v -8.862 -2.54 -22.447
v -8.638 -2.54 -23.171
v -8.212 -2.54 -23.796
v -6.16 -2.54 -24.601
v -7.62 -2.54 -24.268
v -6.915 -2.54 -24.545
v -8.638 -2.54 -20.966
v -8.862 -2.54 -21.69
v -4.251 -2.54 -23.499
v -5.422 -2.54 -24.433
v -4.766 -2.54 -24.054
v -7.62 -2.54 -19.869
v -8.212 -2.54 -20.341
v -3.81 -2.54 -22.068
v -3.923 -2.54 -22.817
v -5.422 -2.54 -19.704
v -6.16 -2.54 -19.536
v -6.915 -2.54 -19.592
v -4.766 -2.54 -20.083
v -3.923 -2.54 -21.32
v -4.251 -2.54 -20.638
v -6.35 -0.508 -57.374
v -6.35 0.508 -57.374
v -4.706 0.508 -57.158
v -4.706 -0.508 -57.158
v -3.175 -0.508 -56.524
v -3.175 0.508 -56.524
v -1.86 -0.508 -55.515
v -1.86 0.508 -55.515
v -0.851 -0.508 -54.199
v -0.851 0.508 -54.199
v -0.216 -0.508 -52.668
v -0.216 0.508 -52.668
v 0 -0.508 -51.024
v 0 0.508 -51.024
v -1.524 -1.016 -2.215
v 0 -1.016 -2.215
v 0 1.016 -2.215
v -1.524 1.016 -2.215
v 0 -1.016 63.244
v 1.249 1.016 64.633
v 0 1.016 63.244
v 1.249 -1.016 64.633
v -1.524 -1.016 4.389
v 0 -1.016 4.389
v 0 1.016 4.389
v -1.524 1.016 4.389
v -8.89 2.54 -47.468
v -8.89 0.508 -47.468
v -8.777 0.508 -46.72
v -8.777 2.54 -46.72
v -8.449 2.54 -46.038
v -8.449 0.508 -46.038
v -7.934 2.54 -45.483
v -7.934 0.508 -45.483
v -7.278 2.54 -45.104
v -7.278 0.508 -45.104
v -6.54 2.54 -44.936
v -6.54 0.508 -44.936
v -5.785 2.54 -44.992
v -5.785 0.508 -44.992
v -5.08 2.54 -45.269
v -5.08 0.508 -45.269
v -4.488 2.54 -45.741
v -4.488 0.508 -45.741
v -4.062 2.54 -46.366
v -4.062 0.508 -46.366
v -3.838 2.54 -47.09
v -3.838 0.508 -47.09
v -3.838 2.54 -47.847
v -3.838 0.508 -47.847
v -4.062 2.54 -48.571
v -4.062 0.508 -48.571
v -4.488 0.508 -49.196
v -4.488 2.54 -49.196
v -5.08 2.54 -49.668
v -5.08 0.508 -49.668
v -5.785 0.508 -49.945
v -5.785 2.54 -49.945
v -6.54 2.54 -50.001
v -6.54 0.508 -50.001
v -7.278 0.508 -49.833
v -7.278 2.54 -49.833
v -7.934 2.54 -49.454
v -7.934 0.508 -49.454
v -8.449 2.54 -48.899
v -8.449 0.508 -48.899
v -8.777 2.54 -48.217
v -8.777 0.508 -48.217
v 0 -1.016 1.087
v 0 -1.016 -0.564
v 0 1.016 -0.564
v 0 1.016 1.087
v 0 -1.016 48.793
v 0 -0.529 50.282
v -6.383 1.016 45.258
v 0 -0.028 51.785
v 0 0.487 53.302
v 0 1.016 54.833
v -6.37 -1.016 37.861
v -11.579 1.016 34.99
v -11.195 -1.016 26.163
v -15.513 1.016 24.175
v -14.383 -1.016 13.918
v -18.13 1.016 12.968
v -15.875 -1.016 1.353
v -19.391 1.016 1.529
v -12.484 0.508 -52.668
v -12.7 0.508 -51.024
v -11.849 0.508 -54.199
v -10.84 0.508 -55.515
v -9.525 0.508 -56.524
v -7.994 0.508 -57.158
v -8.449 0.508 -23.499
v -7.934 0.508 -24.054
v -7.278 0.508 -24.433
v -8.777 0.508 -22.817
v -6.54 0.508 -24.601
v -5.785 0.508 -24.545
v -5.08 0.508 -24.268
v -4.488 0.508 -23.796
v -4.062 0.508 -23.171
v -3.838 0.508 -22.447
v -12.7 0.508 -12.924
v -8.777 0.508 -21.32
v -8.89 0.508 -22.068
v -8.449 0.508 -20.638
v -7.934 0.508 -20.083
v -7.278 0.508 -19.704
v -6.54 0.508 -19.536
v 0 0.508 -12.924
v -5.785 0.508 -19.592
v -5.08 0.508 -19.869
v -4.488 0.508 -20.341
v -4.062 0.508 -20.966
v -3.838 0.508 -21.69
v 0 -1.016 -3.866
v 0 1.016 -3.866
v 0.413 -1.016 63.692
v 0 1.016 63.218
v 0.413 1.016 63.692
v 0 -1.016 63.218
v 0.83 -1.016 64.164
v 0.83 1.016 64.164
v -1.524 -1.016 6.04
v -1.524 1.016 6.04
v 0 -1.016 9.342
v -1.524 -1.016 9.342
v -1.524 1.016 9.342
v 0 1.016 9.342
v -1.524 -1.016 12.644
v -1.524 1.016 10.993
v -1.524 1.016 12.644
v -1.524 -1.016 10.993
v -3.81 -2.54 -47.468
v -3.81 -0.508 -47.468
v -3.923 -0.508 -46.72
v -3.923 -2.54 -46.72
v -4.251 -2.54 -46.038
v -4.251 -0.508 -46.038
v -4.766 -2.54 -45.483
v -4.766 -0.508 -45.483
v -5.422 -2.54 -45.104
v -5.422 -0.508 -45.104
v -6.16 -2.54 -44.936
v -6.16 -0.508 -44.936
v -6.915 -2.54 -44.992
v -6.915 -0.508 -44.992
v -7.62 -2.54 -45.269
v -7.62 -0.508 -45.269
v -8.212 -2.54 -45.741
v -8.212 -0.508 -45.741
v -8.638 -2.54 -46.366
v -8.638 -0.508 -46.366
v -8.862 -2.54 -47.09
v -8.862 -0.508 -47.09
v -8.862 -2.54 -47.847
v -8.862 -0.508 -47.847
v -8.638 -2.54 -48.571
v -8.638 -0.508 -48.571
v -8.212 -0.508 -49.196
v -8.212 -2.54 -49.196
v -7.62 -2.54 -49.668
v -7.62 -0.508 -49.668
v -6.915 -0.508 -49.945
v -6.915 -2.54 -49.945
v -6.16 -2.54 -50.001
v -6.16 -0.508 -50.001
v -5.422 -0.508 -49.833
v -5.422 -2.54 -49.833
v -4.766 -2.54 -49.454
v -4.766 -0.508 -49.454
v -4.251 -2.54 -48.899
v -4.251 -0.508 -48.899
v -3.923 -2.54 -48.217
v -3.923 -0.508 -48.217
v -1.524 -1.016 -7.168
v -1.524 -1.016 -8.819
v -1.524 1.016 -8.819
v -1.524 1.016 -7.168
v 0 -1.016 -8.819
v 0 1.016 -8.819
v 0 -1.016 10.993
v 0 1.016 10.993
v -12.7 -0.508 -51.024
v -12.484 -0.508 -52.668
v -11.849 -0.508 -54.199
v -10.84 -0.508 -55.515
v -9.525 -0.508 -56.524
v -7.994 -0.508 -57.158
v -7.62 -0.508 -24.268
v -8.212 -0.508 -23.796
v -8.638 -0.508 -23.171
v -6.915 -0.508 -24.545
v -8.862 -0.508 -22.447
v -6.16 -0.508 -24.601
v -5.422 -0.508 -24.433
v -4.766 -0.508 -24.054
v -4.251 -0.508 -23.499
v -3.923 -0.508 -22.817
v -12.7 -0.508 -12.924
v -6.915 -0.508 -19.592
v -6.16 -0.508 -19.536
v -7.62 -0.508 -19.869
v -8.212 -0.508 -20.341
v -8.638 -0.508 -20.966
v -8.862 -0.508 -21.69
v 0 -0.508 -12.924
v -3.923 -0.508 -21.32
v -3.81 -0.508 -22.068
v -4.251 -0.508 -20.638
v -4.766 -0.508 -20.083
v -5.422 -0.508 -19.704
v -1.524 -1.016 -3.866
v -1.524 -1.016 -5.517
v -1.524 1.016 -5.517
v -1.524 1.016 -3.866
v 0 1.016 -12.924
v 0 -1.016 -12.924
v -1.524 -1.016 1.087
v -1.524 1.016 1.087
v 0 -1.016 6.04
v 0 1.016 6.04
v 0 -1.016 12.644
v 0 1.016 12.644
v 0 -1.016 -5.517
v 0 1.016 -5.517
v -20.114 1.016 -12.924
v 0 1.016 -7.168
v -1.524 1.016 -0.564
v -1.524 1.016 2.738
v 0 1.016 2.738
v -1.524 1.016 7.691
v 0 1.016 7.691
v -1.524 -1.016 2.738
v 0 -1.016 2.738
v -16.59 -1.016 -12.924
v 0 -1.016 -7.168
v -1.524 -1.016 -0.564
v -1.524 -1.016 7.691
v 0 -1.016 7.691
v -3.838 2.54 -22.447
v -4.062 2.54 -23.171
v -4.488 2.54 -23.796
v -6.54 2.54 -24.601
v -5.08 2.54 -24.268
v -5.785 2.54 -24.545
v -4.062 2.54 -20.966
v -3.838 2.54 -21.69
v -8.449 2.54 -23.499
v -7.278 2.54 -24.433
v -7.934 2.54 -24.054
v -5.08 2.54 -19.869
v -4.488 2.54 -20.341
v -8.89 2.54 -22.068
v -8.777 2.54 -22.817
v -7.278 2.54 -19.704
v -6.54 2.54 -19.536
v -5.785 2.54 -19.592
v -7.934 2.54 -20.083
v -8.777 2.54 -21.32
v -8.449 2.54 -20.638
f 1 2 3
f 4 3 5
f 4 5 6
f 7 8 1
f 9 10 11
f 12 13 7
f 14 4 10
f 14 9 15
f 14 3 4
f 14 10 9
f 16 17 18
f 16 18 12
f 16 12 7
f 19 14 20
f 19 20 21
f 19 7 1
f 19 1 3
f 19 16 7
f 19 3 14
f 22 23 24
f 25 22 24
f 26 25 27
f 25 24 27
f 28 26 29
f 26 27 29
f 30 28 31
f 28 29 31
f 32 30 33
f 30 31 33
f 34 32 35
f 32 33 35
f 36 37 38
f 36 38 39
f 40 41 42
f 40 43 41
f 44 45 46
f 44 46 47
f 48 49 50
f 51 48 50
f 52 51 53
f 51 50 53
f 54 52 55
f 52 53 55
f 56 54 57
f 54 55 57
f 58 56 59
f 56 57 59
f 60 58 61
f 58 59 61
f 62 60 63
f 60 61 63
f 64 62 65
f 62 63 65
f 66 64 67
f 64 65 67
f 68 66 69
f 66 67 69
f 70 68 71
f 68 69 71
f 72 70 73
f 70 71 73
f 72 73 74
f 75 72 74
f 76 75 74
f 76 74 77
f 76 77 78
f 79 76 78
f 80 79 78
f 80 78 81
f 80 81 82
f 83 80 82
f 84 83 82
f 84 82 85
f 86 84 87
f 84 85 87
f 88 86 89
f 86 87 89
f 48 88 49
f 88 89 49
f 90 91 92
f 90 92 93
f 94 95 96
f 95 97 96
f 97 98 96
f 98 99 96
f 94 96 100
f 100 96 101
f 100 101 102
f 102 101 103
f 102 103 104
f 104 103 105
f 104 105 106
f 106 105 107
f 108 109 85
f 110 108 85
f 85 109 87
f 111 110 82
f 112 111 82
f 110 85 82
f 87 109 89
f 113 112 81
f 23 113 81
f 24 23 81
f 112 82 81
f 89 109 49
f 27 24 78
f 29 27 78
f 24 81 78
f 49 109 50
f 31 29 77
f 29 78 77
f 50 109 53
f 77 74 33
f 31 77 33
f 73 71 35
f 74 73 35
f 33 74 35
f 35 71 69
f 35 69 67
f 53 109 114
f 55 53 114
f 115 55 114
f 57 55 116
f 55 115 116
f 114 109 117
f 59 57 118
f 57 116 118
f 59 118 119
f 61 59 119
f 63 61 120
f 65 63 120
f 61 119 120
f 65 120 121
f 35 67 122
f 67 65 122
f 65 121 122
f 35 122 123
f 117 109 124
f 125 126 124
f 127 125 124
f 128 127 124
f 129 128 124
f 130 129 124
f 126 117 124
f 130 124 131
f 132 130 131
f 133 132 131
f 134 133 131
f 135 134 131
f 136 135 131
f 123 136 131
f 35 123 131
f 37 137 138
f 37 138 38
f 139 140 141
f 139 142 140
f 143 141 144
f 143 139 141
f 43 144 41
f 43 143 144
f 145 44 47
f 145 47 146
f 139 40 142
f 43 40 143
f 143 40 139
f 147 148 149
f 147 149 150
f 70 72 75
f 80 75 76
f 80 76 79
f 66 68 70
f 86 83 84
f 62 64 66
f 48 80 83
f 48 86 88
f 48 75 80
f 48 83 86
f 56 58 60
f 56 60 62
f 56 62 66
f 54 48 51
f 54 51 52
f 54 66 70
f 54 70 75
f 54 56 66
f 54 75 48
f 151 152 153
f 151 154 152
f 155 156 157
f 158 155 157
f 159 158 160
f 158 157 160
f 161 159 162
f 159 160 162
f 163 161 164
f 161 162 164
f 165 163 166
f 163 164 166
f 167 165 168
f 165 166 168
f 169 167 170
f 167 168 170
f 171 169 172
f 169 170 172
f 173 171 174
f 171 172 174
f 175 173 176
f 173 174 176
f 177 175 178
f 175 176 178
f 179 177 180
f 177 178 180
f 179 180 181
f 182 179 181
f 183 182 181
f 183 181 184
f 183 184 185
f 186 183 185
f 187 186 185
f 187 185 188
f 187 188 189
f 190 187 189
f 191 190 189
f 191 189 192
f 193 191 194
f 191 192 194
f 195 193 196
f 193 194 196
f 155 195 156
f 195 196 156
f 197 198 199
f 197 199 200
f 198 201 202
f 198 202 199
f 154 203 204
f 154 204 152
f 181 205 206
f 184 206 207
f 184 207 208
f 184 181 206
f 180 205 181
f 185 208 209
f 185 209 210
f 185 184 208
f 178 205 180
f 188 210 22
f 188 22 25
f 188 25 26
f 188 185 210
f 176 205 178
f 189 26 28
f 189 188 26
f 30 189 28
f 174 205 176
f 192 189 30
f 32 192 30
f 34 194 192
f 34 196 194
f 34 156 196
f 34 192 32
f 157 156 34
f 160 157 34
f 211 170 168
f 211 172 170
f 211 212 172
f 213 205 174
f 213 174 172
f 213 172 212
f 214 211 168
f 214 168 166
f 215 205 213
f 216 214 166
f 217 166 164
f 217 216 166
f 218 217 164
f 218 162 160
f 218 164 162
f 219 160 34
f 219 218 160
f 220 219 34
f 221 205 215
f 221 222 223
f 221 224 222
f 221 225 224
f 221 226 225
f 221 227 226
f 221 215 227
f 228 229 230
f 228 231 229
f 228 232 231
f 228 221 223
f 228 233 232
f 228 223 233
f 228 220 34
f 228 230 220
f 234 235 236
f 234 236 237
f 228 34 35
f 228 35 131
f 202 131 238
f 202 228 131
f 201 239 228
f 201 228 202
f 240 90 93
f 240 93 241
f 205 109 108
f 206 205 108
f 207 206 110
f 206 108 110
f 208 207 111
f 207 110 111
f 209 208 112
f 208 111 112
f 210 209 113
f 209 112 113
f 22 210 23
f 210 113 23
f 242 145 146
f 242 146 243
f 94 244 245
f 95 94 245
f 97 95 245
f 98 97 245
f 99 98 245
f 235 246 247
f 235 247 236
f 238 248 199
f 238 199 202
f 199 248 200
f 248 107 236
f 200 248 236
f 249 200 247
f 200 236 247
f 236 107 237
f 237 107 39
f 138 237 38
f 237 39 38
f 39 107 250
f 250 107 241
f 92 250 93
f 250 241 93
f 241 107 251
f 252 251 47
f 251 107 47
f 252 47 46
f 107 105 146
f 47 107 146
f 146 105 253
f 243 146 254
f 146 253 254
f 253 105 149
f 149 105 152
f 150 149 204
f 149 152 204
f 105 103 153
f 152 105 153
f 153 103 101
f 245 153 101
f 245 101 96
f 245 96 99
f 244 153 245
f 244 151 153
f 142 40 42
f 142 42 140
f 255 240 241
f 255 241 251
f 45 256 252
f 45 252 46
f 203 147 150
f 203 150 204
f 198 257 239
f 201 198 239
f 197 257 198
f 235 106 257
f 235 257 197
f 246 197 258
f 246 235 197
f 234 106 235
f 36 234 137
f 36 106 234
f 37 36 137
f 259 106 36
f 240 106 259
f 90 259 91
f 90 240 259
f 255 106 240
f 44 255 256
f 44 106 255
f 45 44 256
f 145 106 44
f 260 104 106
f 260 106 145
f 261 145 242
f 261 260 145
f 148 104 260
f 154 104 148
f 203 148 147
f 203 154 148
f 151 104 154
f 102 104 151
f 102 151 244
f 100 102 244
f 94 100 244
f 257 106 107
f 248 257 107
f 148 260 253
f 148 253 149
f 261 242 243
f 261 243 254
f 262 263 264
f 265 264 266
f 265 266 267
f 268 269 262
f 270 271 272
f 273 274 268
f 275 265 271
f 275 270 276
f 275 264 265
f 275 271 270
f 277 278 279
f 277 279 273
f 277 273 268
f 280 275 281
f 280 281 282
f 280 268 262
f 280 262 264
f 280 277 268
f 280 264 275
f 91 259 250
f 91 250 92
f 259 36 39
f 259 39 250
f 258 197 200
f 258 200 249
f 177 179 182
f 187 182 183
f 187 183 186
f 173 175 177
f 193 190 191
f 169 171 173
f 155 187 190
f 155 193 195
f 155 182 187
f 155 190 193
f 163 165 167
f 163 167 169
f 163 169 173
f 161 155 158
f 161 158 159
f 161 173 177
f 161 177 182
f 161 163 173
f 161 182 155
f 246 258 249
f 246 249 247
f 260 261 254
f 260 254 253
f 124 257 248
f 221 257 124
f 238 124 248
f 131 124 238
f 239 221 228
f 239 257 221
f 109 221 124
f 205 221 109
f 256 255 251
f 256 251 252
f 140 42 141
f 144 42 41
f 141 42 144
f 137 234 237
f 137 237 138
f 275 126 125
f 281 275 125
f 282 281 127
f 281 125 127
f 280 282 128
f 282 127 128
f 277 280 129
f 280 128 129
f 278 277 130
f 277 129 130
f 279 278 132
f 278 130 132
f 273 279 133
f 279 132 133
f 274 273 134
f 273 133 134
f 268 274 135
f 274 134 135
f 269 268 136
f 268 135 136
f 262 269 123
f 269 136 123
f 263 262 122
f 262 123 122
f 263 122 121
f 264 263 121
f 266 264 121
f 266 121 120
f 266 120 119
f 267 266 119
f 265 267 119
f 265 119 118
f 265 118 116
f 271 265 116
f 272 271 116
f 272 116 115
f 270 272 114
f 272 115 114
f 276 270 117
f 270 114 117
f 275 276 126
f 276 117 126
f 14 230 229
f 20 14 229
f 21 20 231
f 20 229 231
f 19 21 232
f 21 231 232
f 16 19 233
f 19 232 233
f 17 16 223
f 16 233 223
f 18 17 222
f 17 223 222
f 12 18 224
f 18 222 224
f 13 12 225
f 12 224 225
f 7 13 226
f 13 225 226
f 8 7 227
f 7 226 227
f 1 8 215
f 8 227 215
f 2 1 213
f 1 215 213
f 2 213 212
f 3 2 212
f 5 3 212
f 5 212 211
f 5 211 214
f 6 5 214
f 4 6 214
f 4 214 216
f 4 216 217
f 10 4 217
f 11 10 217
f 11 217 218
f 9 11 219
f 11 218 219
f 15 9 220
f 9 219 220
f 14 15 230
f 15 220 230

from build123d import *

# Parameters (mm, degrees)
F1_DEPTH    = 1.016
F3_DEPTH    = 0.508
F4_R        = 2.54
F5_DEPTH    = 2.032
F6_R        = 2.54
F7_DEPTH    = 2.032
F8_T1_DEPTH = 37.4993793655
F8_T4_ANGLE = 50.8590204833


# Not quite as in the source:
# - a fillet or chamfer that OpenCascade refuses, or shapes differently, is made with other operations: its cross-section is extruded or revolved along the edge and cut away or added


with BuildPart() as f1:
    # F0 (on Front) → F1 (new body, symmetric)
    with BuildSketch(Plane.XZ):
        with BuildLine():
            Line((1.2488319587, 64.6330847304), (0, 63.2437589053))
            Line((0, 63.2437589053), (0, 63.2175266339))
            ThreePointArc((0, 63.2175266339), (0.6211283352, 63.9282061037), (1.2488319587, 64.6330847304))
        make_face()
    extrude(amount=F1_DEPTH, both=True)


with BuildPart() as f1b:
    # F0 (on Front) → F1, piece 2 (new body, symmetric)
    with BuildSketch(Plane.XZ):
        with BuildLine():
            Line((0, 12.6442711507), (0, 63.2175266339))
            ThreePointArc((0, 63.2175266339), (-17.4739565434, 34.5701285719), (-24.6631958803, 1.793194445))
            Line((-24.6631958803, 1.793194445), (-25.4, -12.92445632))
            Line((-25.4, -12.92445632), (-20.955, -12.92445632))
            Line((-20.955, -12.92445632), (-4.445, -12.92445632))
            Line((-4.445, -12.92445632), (0, -12.92445632))
            Line((0, -12.92445632), (0, -8.8187288493))
            Line((0, -8.8187288493), (-1.524, -8.8187288493))
            Line((-1.524, -8.8187288493), (-1.524, -7.1677288493))
            Line((-1.524, -7.1677288493), (0, -7.1677288493))
            Line((0, -7.1677288493), (0, -5.5167288493))
            Line((0, -5.5167288493), (-1.524, -5.5167288493))
            Line((-1.524, -5.5167288493), (-1.524, -3.8657288493))
            Line((-1.524, -3.8657288493), (0, -3.8657288493))
            Line((0, -3.8657288493), (0, -2.2147288493))
            Line((0, -2.2147288493), (-1.524, -2.2147288493))
            Line((-1.524, -2.2147288493), (-1.524, -0.5637288493))
            Line((-1.524, -0.5637288493), (0, -0.5637288493))
            Line((0, -0.5637288493), (0, 1.0872711507))
            Line((0, 1.0872711507), (-1.524, 1.0872711507))
            Line((-1.524, 1.0872711507), (-1.524, 2.7382711507))
            Line((-1.524, 2.7382711507), (0, 2.7382711507))
            Line((0, 2.7382711507), (0, 4.3892711507))
            Line((0, 4.3892711507), (-1.524, 4.3892711507))
            Line((-1.524, 4.3892711507), (-1.524, 6.0402711507))
            Line((-1.524, 6.0402711507), (0, 6.0402711507))
            Line((0, 6.0402711507), (0, 7.6912711507))
            Line((0, 7.6912711507), (-1.524, 7.6912711507))
            Line((-1.524, 7.6912711507), (-1.524, 9.3422711507))
            Line((-1.524, 9.3422711507), (0, 9.3422711507))
            Line((0, 9.3422711507), (0, 10.9932711507))
            Line((0, 10.9932711507), (-1.524, 10.9932711507))
            Line((-1.524, 10.9932711507), (-1.524, 12.6442711507))
            Line((-1.524, 12.6442711507), (0, 12.6442711507))
        make_face()
    extrude(amount=F1_DEPTH, both=True)

    # F2 (on Front) → F3 (join, symmetric)
    with BuildSketch(Plane.XZ):
        with BuildLine():
            Line((0, -11.65445632), (-12.7, -11.65445632))
            Line((-12.7, -11.65445632), (-12.7, -51.02445632))
            ThreePointArc((-12.7, -51.02445632), (-10.8401280605, -55.5145843805), (-6.35, -57.37445632))
            ThreePointArc((-6.35, -57.37445632), (-1.8598719395, -55.5145843805), (0, -51.02445632))
            Line((0, -51.02445632), (0, -11.65445632))
        make_face()
    extrude(amount=F3_DEPTH, both=True)

    # F4 (on face) → F5 (join)
    with BuildSketch(Plane.XZ.offset(0.508)):
        with Locations((-6.35, -22.06845632)):
            Circle(F4_R)
        with Locations((-6.35, -47.46845632)):
            Circle(F4_R)
    extrude(amount=F5_DEPTH)

    # F6 (on face) → F7 (join)
    with BuildSketch(Plane(origin=(0, 0.508, 0), x_dir=(-1, 0, 0), z_dir=(0, 1, 0))):
        with Locations((6.35, -47.46845632)):
            Circle(F6_R)
        with Locations((6.35, -22.06845632)):
            Circle(F6_R)
    extrude(amount=F7_DEPTH)

    # F8: chamfer of 5.08 x 8.7988181024 on 1 edges, made by hand

    # F8_s2 → F8_t1 (cut)
    with BuildSketch(Plane(origin=(0.0278895878, 0, 0.5570940792), x_dir=(0, 1, 0), z_dir=(-0.05, 0, -0.9987492178))):
        Polygon((-1.016, -15.923189213), (4.064, -24.7220073154), (-1.016, -24.7220073154), align=None)
    extrude(amount=F8_T1_DEPTH, mode=Mode.SUBTRACT)

    # F8_s3 → F8_t4 (revolve, cut)
    with BuildSketch(Plane(origin=(48.3536933956, 0, 35.4868407309), x_dir=(0, 1, 0), z_dir=(0.8061865661, 0, 0.5916614071))):
        Polygon((-1.016, 44.7060536536), (4.064, 53.5048717561), (-1.016, 53.5048717561), align=None)
    revolve(axis=Axis((76.8097246454, -1.016, -3.286805555), (0, -1, 0)), revolution_arc=F8_T4_ANGLE, mode=Mode.SUBTRACT)


solid = Compound([f1.part, f1b.part])
